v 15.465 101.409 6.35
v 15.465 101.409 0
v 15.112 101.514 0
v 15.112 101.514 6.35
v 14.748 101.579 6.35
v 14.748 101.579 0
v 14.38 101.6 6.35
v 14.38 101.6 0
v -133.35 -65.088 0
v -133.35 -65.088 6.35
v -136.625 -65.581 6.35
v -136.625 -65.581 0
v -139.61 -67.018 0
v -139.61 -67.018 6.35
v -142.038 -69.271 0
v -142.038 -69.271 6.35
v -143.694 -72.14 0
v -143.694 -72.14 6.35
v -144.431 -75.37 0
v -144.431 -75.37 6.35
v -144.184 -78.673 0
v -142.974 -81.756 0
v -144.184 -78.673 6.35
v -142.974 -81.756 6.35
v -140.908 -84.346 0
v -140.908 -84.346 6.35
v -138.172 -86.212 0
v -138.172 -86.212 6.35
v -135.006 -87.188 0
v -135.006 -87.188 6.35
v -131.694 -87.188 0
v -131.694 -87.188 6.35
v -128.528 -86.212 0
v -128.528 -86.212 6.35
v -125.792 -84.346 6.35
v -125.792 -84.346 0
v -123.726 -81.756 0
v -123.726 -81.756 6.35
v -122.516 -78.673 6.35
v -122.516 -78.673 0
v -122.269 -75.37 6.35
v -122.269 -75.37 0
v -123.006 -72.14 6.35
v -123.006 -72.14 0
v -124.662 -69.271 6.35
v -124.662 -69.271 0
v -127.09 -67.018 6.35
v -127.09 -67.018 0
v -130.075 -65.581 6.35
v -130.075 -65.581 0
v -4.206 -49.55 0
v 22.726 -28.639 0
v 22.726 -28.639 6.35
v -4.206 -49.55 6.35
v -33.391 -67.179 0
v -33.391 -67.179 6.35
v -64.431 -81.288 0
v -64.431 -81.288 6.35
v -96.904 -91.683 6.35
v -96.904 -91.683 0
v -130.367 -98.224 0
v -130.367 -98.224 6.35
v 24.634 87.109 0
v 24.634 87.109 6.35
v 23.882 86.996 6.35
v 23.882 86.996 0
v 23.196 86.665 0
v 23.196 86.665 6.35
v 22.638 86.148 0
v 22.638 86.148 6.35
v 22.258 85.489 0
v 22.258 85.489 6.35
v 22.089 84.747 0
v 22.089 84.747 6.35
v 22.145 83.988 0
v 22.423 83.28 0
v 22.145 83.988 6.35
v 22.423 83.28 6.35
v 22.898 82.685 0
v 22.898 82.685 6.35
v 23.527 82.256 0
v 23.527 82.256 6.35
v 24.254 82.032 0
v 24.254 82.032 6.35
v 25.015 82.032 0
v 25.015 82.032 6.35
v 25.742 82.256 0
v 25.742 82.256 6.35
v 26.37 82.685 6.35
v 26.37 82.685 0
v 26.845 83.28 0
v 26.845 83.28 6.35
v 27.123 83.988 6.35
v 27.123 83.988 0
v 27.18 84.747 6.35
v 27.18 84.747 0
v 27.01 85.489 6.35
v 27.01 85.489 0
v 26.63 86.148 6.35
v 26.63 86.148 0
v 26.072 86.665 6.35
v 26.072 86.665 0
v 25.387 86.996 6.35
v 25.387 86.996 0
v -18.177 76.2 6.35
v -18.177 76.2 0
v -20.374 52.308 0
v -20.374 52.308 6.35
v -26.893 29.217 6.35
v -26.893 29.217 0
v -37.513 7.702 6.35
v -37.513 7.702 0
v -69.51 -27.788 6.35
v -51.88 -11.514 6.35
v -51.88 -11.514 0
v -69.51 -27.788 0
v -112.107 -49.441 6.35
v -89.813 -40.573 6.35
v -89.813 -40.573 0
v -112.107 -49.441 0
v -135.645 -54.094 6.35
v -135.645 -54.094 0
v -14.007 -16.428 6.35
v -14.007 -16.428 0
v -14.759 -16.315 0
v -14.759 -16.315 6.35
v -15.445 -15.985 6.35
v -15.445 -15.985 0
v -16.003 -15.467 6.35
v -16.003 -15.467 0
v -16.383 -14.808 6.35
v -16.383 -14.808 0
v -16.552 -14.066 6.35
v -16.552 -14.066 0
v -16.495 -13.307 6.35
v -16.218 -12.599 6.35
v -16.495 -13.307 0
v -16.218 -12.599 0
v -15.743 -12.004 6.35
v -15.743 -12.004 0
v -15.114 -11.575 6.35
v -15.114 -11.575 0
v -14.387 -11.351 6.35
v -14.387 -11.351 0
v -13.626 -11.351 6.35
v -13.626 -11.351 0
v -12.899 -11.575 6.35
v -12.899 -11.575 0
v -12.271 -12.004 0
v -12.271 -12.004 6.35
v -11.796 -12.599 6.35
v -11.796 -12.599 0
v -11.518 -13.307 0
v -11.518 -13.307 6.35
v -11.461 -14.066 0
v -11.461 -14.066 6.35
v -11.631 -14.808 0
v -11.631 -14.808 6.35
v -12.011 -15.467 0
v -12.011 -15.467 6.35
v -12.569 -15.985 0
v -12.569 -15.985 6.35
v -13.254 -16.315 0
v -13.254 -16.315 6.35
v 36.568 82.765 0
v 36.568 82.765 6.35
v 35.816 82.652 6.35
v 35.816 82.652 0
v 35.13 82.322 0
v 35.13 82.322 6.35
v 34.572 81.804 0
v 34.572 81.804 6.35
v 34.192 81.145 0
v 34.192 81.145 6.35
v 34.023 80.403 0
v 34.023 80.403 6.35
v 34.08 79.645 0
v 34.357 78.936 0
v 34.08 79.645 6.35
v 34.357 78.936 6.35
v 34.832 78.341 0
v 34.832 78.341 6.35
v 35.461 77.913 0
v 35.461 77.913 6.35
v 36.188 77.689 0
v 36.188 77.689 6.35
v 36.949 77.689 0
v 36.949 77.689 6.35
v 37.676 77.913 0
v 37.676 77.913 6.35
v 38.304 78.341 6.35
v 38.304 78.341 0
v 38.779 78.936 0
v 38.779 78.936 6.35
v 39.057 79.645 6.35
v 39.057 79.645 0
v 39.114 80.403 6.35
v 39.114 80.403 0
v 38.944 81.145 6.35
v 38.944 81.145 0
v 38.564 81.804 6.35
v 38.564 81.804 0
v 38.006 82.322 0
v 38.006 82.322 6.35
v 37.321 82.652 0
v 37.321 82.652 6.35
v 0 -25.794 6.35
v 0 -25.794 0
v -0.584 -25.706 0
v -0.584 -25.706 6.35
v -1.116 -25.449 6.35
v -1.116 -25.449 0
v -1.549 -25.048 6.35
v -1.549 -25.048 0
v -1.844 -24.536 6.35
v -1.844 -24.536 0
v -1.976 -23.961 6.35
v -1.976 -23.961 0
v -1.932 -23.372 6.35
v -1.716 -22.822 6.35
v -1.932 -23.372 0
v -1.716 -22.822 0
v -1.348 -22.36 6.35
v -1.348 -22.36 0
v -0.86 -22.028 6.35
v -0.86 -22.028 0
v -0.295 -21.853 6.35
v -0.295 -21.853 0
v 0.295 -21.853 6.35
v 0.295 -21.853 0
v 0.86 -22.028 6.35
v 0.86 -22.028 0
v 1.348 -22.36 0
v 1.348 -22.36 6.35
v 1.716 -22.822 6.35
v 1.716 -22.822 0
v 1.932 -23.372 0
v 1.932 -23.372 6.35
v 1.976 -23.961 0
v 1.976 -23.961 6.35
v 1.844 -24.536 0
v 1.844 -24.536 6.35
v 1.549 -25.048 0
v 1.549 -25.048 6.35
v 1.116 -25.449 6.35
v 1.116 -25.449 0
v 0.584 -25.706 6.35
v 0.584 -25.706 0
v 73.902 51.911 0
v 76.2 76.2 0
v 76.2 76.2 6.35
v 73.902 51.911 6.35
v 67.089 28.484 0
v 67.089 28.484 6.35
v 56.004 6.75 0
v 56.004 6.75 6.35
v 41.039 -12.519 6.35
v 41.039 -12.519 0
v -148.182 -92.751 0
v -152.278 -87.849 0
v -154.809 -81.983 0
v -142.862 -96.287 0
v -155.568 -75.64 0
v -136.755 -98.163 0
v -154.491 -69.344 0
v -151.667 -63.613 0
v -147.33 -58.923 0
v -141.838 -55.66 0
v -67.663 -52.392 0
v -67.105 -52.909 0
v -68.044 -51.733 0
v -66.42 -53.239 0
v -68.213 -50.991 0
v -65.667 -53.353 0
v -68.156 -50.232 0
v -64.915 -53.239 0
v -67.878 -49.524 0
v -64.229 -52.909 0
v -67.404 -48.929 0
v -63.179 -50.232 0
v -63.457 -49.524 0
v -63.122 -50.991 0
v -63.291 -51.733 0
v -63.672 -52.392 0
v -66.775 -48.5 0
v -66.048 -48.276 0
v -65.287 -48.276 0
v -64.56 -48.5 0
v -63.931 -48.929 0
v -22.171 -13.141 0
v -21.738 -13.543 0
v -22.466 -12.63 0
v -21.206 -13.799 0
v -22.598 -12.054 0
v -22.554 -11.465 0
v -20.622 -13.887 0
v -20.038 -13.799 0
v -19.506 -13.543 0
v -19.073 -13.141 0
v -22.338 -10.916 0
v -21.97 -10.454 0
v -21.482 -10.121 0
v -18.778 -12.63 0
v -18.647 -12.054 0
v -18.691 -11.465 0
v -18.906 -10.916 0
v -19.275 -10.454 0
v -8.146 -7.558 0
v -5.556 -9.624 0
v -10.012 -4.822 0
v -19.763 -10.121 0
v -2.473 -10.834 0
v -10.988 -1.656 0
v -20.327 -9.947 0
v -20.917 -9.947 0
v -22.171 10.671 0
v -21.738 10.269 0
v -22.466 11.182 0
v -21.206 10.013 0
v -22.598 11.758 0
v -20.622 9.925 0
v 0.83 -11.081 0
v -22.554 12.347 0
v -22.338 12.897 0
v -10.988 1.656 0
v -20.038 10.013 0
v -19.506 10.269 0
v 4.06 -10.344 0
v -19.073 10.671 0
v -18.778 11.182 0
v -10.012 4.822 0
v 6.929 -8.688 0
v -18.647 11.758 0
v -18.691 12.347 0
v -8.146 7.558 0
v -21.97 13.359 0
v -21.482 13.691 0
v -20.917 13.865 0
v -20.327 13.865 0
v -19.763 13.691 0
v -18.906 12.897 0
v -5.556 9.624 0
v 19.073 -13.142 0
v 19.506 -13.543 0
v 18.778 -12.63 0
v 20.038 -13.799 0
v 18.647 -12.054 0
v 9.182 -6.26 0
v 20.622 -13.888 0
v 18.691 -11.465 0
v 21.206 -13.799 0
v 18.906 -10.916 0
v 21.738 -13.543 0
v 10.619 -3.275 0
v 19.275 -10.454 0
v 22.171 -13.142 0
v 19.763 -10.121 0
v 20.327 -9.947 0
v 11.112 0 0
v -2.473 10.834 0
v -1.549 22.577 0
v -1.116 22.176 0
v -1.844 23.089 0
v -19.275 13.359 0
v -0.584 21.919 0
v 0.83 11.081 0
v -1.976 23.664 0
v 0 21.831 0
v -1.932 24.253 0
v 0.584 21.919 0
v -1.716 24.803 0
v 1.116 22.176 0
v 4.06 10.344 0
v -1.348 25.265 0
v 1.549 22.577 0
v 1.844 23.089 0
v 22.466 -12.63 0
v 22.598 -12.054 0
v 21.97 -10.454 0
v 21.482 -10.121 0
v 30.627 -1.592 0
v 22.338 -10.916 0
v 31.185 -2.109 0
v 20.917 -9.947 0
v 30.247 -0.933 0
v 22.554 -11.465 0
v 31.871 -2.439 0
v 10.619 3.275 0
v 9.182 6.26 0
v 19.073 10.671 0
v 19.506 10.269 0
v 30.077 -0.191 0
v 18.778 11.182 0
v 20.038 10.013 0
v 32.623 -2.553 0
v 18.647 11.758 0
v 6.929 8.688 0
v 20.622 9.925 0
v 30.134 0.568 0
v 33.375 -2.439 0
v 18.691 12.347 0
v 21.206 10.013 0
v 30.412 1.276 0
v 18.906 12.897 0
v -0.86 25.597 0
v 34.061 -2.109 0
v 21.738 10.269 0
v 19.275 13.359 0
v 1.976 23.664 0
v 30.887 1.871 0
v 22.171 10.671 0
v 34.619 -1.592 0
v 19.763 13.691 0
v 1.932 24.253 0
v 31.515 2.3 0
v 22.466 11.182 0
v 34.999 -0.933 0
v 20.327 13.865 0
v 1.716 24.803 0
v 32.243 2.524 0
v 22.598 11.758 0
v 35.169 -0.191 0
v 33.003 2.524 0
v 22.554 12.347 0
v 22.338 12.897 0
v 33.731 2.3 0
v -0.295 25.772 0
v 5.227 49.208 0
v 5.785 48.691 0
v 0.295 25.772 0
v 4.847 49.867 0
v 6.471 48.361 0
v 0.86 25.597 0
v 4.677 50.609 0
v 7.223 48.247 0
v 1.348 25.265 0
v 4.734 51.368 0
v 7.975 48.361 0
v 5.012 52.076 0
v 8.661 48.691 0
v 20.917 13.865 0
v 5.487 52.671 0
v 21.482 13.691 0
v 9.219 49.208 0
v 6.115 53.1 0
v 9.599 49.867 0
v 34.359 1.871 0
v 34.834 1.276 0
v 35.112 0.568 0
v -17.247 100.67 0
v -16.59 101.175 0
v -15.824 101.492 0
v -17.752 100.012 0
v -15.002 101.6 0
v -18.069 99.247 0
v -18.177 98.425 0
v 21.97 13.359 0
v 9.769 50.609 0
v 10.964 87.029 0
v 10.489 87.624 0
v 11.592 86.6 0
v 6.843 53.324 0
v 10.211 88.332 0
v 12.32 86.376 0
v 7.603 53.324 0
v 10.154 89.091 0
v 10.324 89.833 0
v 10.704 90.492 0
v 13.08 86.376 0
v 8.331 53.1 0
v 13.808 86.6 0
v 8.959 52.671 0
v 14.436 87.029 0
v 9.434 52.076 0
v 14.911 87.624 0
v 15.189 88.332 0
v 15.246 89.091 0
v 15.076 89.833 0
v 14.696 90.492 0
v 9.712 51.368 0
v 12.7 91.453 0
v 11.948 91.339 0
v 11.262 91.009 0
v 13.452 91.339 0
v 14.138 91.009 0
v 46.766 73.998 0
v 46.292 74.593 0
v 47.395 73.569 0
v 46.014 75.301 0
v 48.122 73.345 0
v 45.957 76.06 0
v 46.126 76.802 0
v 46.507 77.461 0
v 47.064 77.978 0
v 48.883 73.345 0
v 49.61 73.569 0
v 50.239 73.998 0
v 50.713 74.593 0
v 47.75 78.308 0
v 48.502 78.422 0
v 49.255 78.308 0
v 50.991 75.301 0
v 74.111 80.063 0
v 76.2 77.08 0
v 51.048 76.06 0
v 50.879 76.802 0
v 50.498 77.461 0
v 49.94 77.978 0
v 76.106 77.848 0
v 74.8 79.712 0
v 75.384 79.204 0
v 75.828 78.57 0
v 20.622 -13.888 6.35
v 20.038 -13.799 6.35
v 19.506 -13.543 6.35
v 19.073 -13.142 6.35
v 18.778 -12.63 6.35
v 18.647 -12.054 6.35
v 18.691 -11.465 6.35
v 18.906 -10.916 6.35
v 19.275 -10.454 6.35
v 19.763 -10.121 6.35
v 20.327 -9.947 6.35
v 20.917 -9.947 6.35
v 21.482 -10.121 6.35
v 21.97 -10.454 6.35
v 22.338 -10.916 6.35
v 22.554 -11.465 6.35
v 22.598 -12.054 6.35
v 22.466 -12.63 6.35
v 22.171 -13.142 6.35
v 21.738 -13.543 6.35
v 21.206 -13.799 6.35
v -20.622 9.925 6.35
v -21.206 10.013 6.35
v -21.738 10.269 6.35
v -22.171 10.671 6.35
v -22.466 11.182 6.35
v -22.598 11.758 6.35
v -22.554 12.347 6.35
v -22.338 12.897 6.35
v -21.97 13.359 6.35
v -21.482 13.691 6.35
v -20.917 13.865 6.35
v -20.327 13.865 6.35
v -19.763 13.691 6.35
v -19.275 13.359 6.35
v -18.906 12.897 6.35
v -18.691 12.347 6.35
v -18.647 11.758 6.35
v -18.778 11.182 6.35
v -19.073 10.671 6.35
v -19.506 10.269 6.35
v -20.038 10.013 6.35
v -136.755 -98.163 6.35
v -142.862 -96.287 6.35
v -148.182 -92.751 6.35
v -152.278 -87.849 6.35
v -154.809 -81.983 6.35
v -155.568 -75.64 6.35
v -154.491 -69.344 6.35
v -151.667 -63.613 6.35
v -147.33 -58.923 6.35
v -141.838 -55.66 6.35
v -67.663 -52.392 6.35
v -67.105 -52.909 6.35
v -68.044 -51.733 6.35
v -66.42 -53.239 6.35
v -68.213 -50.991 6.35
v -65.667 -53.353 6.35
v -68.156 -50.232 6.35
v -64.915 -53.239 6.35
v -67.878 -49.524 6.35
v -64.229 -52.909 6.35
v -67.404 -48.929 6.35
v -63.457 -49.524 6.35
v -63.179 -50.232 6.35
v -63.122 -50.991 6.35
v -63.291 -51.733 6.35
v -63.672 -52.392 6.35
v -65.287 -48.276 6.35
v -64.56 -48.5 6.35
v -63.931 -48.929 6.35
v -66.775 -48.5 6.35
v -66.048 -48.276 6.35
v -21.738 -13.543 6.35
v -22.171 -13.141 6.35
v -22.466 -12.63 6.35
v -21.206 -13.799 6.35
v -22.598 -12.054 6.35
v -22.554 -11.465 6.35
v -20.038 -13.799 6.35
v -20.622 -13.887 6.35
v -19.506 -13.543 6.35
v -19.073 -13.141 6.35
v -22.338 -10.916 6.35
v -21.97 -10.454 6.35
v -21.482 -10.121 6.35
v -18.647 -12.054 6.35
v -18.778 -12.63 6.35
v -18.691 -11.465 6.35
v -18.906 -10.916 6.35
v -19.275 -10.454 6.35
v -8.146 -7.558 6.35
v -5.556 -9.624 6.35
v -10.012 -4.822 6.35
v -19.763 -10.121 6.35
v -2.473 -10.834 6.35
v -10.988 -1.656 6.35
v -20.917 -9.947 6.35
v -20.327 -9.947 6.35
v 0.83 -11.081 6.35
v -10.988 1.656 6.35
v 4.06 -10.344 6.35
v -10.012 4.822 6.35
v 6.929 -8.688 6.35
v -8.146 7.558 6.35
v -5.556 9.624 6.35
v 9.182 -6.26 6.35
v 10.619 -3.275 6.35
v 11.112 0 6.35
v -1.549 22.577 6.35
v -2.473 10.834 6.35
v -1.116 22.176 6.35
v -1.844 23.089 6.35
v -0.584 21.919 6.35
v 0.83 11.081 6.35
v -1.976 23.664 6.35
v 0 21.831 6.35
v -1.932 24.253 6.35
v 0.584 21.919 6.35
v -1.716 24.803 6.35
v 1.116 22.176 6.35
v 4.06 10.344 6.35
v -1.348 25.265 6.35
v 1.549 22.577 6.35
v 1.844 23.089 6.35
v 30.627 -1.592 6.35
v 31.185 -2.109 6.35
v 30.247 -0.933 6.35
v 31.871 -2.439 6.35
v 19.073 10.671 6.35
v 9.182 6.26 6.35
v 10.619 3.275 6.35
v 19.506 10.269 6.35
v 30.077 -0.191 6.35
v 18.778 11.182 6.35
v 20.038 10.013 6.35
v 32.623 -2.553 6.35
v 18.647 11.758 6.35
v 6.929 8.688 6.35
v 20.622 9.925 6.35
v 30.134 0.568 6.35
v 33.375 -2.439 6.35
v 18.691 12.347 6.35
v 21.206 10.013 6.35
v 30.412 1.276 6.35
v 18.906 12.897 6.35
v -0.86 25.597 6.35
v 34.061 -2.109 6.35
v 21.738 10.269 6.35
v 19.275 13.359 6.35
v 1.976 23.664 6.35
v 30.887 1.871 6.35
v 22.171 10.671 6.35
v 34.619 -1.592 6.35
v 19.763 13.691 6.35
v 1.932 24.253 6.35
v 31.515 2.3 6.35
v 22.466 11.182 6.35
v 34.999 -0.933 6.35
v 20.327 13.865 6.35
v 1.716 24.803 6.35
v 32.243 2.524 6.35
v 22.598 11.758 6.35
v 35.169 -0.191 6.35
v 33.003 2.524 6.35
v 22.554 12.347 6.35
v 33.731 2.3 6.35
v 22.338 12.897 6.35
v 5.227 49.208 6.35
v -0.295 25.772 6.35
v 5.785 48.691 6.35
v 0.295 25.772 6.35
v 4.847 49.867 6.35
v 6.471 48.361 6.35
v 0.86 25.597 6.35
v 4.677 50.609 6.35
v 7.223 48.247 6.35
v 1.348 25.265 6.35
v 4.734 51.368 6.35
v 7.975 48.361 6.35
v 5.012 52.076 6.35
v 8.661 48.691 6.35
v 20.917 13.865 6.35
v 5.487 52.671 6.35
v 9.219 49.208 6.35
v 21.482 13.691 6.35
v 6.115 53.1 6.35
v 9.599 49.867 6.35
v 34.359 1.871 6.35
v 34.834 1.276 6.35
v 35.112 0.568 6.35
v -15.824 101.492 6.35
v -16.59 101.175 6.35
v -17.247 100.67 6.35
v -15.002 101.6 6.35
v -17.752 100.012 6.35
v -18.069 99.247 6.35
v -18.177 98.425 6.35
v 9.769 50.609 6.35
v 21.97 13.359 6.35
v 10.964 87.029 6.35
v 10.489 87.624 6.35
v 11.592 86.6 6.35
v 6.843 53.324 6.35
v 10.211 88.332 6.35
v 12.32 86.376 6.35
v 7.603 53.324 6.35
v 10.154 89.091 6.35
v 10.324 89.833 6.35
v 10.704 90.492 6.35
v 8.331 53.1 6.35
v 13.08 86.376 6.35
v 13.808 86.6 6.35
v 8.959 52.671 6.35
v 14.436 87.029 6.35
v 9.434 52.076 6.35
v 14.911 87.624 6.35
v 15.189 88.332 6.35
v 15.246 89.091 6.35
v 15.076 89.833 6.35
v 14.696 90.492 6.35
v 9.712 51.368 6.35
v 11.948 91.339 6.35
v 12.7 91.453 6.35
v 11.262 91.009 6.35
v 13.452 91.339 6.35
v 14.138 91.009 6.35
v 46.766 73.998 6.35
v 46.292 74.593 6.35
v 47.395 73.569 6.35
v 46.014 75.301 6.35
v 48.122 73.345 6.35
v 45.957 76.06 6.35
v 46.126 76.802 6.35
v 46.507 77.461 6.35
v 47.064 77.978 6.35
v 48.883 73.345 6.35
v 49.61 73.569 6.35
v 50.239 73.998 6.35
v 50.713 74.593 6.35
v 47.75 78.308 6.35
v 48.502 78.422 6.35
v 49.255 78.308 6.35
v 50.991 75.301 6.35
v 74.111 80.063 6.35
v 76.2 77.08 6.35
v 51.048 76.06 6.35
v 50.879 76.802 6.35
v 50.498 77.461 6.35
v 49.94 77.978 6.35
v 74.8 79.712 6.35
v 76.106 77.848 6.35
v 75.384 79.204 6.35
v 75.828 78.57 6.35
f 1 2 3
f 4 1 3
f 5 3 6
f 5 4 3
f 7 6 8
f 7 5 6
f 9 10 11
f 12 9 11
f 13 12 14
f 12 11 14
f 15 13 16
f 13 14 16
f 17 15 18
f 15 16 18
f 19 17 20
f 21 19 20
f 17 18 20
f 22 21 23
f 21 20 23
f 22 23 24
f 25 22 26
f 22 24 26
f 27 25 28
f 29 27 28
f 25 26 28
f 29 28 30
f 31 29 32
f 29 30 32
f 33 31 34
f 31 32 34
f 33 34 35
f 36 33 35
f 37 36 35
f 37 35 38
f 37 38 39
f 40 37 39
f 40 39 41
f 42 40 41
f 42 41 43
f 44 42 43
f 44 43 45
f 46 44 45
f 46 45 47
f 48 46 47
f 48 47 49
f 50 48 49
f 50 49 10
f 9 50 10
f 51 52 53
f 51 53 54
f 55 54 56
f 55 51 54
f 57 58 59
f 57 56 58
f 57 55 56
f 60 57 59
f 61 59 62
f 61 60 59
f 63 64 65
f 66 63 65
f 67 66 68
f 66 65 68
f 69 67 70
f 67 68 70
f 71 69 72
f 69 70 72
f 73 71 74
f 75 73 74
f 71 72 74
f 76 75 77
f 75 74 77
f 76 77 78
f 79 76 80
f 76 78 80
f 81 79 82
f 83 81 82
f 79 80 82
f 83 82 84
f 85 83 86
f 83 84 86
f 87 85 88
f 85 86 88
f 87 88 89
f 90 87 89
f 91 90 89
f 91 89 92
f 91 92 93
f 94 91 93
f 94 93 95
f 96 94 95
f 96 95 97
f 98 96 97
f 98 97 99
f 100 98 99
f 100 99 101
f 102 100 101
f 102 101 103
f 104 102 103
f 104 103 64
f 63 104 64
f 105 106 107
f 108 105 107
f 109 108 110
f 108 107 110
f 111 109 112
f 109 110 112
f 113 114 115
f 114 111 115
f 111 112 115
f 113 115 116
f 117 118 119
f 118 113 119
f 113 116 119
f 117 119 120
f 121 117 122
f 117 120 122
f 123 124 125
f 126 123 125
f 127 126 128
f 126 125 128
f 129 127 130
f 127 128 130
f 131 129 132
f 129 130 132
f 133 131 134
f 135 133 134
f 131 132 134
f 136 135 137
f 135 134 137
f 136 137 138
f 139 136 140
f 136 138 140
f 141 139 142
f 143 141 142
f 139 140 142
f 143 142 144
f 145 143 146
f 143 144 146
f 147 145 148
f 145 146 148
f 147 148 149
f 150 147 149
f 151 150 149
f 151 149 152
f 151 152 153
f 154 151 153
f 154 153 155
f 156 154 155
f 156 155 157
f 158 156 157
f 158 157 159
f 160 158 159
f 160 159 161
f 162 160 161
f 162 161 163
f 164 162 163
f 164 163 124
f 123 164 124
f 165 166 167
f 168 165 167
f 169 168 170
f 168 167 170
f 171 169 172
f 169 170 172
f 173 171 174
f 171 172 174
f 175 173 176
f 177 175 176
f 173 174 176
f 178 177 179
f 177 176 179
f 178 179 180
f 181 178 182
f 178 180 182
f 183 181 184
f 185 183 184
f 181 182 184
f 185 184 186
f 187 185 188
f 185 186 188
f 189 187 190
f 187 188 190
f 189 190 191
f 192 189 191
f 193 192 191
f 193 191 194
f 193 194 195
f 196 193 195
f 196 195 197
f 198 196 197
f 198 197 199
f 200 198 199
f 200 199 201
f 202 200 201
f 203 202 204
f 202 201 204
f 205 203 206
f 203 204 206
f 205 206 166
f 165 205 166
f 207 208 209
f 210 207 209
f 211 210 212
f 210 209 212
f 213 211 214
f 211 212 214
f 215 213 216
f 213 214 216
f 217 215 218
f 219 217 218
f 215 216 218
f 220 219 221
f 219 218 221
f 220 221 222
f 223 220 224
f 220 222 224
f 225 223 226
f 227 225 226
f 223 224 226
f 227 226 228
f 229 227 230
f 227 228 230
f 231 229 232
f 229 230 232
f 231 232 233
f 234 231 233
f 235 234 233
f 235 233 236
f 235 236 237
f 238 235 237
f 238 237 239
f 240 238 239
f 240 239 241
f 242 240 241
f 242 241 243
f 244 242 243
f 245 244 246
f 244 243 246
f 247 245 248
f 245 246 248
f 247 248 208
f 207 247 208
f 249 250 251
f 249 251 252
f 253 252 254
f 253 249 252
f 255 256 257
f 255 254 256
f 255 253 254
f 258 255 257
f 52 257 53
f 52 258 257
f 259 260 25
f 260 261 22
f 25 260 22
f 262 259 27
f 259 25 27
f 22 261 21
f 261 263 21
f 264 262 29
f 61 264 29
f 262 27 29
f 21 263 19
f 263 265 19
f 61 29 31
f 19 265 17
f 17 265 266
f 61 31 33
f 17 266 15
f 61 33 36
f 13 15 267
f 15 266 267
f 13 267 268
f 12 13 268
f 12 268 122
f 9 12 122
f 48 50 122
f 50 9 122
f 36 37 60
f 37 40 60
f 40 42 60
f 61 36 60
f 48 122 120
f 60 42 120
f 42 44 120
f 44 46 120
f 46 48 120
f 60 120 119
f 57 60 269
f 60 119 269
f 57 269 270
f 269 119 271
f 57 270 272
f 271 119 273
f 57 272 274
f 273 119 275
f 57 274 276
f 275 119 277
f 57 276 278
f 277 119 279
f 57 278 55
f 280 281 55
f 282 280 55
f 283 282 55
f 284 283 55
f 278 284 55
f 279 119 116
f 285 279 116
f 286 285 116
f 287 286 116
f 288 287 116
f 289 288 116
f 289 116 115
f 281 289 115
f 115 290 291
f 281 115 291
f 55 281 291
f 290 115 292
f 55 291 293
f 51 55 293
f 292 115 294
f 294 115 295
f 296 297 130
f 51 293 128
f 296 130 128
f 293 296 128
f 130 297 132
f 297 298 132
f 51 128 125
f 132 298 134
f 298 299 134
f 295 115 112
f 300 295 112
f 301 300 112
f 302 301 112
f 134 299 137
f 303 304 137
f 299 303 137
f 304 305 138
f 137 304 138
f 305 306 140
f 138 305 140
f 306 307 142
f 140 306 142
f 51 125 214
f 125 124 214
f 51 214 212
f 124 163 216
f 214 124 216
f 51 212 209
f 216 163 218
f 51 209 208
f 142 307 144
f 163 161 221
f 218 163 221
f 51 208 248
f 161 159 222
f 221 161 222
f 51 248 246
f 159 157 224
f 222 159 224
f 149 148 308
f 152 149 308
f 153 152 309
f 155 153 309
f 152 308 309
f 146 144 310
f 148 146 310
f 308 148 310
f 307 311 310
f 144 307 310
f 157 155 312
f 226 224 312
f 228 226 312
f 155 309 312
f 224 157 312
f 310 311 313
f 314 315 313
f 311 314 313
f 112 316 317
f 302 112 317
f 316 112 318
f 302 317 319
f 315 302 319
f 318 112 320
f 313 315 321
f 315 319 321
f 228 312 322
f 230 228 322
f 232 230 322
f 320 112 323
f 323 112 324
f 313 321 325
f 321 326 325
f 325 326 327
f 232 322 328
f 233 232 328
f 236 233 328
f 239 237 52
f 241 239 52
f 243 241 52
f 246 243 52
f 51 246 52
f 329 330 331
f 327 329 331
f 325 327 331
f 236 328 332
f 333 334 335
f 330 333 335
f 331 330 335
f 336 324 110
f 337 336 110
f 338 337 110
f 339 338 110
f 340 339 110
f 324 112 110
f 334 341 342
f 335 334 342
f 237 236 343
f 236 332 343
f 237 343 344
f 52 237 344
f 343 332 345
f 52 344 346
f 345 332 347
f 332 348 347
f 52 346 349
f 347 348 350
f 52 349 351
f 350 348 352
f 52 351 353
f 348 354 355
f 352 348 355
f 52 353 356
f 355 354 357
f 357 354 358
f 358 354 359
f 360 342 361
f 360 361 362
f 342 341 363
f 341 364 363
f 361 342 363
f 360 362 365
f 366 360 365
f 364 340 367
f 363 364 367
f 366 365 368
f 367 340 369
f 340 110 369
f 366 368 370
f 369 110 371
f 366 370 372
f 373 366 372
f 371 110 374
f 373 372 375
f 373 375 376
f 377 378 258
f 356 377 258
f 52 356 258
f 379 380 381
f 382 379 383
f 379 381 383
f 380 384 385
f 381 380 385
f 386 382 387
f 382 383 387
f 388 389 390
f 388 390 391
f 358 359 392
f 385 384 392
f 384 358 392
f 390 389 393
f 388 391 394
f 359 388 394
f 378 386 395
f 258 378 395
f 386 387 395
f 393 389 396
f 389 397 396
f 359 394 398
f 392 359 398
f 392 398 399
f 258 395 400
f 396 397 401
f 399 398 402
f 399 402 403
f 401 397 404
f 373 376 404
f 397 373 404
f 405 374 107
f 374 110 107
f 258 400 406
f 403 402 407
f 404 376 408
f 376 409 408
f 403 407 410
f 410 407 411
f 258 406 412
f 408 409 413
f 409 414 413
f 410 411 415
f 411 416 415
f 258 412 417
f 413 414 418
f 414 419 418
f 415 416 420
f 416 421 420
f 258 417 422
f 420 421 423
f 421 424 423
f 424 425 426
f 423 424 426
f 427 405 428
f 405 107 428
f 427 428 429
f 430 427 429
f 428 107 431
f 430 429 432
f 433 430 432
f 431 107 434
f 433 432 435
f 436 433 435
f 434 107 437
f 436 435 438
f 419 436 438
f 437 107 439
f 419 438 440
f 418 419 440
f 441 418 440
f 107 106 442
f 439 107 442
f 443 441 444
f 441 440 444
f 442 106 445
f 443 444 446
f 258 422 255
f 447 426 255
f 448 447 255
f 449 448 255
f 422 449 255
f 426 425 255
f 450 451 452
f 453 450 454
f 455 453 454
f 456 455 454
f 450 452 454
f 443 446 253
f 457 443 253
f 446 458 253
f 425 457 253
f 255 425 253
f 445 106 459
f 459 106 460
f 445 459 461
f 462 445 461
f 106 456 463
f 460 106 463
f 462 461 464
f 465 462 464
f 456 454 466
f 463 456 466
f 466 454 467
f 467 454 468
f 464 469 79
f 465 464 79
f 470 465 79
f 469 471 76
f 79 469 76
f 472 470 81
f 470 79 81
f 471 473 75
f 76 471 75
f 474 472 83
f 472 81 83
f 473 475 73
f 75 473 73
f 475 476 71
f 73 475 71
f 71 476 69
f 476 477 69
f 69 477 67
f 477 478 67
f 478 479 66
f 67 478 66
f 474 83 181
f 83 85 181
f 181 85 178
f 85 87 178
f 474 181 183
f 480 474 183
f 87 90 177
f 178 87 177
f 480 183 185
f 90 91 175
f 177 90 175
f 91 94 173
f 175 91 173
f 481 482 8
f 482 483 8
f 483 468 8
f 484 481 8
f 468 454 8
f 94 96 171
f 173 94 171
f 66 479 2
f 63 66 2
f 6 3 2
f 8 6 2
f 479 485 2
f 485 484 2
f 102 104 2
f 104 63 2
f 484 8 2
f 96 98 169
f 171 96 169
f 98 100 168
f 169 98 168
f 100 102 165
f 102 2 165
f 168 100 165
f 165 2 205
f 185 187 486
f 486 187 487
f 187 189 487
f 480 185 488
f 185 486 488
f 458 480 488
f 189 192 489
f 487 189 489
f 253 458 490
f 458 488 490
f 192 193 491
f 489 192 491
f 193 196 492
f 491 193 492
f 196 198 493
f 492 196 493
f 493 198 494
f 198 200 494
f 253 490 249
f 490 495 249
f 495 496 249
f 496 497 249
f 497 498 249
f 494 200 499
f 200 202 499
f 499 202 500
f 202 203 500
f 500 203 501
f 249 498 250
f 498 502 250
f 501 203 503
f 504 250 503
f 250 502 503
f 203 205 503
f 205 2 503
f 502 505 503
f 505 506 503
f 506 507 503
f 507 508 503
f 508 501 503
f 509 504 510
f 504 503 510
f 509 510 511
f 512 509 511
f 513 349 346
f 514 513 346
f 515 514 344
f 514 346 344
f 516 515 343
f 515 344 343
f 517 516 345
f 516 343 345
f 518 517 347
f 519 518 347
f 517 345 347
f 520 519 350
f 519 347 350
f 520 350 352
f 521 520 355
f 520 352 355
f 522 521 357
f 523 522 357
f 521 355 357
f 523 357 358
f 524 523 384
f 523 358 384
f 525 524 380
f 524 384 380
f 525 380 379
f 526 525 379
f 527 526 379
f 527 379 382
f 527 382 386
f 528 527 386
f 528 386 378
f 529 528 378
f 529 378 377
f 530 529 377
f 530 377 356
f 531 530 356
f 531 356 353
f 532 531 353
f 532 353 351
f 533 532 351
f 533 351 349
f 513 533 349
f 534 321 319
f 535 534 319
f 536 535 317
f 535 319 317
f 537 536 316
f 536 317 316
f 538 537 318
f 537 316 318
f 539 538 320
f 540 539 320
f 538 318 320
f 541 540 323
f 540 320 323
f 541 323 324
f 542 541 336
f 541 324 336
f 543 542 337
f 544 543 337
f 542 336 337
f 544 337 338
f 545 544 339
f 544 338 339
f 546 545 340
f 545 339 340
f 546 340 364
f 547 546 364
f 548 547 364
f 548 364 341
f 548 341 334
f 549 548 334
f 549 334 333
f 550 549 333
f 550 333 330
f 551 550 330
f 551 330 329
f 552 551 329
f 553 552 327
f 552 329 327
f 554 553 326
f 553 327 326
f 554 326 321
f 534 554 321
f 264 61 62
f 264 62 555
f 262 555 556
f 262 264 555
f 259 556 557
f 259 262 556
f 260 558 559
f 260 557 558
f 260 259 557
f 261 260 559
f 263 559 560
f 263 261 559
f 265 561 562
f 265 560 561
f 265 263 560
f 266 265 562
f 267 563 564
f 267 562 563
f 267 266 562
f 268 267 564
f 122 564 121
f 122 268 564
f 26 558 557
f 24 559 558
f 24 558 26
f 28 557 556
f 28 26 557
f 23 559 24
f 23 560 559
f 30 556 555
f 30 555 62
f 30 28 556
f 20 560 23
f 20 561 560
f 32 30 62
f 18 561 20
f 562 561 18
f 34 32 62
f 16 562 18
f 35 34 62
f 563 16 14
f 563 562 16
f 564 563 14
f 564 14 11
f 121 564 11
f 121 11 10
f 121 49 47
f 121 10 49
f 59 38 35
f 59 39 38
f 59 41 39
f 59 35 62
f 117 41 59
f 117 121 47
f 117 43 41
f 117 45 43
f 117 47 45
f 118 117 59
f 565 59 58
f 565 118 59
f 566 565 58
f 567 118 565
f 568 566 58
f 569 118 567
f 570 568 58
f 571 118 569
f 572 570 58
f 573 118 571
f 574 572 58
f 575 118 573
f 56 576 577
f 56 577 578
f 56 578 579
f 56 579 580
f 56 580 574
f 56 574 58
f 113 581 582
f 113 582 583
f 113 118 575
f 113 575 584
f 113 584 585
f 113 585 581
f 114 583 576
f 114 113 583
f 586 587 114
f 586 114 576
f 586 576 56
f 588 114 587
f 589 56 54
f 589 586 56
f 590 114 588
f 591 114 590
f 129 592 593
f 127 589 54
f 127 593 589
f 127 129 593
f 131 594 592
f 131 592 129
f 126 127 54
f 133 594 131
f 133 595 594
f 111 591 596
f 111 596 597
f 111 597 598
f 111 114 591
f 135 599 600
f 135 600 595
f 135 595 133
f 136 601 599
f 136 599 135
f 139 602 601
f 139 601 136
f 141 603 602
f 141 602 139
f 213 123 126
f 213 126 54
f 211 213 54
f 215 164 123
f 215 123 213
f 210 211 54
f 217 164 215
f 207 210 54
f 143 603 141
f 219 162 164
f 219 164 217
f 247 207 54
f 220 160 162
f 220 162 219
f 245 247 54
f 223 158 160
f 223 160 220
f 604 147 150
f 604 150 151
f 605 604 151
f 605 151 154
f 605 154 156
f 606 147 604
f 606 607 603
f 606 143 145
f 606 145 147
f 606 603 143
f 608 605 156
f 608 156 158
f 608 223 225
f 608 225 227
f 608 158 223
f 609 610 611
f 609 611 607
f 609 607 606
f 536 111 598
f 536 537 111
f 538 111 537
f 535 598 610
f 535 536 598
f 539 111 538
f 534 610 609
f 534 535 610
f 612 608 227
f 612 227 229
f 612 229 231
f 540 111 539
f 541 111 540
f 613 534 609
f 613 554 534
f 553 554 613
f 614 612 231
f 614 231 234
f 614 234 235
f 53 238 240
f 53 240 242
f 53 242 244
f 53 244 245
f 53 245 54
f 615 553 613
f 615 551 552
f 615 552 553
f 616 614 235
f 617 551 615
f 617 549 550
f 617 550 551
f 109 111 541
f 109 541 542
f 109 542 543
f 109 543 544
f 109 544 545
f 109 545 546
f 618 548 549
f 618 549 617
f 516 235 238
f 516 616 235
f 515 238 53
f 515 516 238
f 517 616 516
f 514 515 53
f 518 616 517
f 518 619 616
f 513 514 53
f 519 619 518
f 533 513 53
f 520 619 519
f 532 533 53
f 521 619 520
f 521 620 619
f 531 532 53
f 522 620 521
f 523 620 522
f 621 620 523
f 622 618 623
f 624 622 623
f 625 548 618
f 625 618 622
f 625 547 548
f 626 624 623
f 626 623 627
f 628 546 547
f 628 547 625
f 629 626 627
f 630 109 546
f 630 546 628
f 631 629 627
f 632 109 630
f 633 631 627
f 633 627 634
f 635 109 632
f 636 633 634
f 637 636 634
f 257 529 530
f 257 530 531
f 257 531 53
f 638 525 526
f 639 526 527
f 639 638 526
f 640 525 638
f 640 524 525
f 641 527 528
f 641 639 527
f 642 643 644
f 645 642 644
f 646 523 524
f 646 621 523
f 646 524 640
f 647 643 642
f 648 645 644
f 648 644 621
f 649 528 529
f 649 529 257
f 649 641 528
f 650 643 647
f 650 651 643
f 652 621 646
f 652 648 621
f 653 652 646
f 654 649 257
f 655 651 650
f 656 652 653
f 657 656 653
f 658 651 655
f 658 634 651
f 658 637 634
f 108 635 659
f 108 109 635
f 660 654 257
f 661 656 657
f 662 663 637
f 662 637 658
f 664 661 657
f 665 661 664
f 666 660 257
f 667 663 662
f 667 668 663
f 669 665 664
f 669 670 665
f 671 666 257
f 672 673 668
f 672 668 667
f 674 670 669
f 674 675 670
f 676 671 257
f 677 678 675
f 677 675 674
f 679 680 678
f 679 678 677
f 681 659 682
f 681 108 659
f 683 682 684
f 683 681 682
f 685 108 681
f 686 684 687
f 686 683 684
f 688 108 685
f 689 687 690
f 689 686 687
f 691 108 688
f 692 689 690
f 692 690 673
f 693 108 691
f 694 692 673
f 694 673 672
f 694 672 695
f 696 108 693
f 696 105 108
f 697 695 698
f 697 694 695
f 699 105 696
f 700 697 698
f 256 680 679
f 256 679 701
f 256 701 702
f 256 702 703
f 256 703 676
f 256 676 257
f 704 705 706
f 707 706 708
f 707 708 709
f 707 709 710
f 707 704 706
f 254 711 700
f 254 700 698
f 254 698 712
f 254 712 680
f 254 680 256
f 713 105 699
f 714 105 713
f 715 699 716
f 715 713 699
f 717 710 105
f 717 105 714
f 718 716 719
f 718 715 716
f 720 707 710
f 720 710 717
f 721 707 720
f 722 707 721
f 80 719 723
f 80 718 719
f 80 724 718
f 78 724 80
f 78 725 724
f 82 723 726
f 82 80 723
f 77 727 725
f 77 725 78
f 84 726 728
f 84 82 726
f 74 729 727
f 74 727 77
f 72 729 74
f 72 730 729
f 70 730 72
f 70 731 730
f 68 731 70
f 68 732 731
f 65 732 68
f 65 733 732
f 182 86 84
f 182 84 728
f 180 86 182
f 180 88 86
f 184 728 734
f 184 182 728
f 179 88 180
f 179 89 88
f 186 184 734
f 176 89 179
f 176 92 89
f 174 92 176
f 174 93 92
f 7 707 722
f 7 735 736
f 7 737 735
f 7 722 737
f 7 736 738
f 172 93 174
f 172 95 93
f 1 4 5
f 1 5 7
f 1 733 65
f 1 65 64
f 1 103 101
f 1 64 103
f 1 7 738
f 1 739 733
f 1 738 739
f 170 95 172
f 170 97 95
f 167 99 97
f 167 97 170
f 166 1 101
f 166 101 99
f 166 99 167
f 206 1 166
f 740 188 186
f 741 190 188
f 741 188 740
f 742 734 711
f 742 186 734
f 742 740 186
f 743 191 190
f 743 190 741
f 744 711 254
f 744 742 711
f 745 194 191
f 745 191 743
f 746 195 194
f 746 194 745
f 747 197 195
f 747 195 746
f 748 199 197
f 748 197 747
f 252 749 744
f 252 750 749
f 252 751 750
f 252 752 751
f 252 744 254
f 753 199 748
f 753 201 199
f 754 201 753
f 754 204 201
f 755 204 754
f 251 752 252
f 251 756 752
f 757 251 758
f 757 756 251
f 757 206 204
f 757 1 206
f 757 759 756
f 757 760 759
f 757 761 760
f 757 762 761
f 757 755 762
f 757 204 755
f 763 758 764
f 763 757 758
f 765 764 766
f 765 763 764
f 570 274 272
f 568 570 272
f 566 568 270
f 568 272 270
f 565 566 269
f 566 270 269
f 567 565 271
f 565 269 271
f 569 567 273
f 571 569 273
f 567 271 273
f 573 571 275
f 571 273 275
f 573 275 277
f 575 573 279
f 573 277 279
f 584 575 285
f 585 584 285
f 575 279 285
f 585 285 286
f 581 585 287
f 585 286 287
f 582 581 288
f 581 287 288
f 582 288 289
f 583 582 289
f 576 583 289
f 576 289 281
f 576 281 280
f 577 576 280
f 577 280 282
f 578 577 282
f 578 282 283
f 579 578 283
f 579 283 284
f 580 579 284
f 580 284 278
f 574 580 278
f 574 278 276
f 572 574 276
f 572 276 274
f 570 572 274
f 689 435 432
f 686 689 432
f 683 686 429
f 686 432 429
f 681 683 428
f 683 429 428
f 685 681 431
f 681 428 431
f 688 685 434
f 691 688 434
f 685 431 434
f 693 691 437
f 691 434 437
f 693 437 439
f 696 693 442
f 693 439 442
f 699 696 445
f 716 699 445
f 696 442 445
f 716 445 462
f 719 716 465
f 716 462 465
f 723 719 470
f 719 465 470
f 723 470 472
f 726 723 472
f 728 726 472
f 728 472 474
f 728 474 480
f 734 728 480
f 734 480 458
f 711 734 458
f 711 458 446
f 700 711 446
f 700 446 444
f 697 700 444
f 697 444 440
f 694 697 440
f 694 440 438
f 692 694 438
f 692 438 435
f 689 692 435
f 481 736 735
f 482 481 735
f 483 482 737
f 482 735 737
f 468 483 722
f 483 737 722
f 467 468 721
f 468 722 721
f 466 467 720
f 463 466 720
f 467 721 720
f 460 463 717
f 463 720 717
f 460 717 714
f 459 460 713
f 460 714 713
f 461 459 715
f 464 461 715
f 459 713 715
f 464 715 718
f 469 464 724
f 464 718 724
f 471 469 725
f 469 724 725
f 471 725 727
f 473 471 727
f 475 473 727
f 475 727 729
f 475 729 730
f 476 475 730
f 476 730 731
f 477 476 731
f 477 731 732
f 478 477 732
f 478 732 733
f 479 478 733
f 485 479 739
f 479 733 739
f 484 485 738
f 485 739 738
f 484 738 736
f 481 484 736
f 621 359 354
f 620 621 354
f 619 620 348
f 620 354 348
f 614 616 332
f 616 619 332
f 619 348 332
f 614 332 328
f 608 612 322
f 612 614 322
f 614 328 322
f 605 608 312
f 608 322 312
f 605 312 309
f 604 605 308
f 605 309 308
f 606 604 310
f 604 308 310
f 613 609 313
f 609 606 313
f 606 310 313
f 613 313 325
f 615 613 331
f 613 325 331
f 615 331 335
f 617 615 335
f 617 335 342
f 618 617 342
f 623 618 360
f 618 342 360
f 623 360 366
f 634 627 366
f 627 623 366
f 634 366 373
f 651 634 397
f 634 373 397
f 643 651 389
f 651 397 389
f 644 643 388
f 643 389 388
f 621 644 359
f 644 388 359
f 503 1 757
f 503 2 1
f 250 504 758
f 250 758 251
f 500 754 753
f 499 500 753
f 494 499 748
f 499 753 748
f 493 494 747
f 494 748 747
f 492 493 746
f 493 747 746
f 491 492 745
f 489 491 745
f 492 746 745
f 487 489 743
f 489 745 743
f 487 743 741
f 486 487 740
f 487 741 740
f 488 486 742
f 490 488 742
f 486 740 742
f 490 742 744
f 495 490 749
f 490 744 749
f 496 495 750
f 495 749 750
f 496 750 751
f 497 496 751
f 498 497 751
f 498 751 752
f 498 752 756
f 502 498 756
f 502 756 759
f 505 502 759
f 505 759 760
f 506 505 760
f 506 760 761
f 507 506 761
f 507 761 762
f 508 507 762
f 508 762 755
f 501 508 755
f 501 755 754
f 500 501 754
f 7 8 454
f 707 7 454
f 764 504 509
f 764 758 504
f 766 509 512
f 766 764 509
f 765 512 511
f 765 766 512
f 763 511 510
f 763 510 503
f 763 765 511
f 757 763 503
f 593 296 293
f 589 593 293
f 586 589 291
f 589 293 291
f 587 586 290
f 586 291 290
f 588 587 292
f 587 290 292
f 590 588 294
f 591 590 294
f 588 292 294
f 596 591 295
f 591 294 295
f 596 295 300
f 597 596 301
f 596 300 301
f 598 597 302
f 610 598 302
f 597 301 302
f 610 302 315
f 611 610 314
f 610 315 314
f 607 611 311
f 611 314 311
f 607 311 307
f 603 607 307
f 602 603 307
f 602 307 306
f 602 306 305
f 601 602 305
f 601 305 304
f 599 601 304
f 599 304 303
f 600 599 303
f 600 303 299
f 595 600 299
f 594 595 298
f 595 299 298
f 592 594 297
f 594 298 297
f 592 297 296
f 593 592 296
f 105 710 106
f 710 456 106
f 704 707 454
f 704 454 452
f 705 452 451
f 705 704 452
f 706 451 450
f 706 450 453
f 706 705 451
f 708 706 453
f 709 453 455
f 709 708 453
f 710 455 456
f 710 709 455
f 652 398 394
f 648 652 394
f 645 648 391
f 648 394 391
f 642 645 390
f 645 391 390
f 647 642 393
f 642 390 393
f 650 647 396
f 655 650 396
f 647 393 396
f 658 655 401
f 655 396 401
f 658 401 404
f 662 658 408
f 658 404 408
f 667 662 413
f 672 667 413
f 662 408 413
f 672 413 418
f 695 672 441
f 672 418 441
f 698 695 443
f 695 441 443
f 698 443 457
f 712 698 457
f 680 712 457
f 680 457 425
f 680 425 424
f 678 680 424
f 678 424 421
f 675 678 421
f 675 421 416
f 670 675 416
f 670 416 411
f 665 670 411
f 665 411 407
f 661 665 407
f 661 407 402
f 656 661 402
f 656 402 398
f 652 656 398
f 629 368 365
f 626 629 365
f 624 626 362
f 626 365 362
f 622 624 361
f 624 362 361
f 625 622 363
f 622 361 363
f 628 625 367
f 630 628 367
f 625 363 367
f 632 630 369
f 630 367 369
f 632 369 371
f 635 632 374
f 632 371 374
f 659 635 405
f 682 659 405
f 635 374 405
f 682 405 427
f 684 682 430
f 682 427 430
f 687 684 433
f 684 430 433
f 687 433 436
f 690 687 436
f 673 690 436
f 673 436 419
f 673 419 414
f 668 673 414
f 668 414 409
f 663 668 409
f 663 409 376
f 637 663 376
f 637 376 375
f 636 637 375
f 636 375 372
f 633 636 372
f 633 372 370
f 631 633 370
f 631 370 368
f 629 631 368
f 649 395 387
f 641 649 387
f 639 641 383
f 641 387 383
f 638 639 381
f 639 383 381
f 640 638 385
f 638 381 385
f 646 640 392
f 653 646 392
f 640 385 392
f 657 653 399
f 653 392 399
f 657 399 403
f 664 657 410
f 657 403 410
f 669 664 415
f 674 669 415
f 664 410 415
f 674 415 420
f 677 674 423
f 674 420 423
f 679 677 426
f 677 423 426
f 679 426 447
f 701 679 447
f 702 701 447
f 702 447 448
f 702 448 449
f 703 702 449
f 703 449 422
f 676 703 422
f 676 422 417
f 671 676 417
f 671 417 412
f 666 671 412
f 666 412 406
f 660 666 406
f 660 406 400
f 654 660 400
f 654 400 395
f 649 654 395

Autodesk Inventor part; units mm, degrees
ref_plane "YZ Plane" through (0, 0, 0) normal (1, 0, 0) x (0, 1, 0)
ref_plane "XZ Plane" through (0, 0, 0) normal (0, 1, 0) x (-1, 0, 0)
ref_plane "XY Plane" through (0, 0, 0) normal (0, 0, 1) x (1, 0, 0)
sketch "Sketch1" plane through (0, 0, 0) normal (0, 0, 1) x (1, 0, 0)
  line L0 (-146.05, 101.6) -> (76.2, 101.6) construction
  line L1 (76.2, 101.6) -> (76.2, 76.2) construction
  line L2 (76.2, 76.2) -> (-146.05, 76.2) construction
  line L3 (-146.05, 76.2) -> (-146.05, 101.6) construction
  circle A0 centre (-133.35, -76.2) radius 12.7 construction
  circle A1 centre (0, 0) radius 23.8125 construction
  circle A2 centre (0, 0) radius 11.1125
  circle A3 centre (0, 0) radius 36.5125 construction
  line L4 (76.2, 101.6) -> (76.2, 76.2)
  line L5 (76.2, 101.6) -> (-18.177, 101.6)
  line L6 (-18.177, 101.6) -> (-18.177, 76.2)
  circle A4 centre (-133.35, -76.2) radius 22.225 construction
  arc A5 (-135.6449, -54.0938) -> (-18.177, 76.2) centre (-149.171, 76.2) ccw
  arc A6 (-130.367, -98.2239) -> (24.2247, -27.319) centre (-169.5727, 191.233) ccw
  arc A7 (-135.6449, -54.0938) -> (-130.367, -98.2239) centre (-133.35, -76.2) ccw
  arc A8 (20.9302, -29.9181) -> (76.2, 76.2) centre (-53.3082, 76.2) ccw
  arc A9 (24.2247, -27.319) -> (30.9373, -19.3918) centre (0, 0) ccw
  line L7 (-69.85, 101.6) -> (-69.85, 76.2) construction
  line L8 (12.7, 88.9) -> (75.7926, 65.9362) construction
  line L9 (14.9394, 101.6) -> (76.2, 79.3029)
  point P0 (63.5, 88.9)
  point P1 (76.2, 88.9)
  point P2 (50.8, 88.9)
  point P3 (38.1, 88.9)
  point P4 (25.4, 88.9)
  point P5 (20.9302, -29.9181)
  point P6 (-34.5726, 11.7429)
  point P7 (22.7258, -28.6389)
  point P8 (-69.85, 88.9)
  point P9 (24.6341, 84.5563)
  point P10 (36.5682, 80.2127)
  point P11 (48.5023, 75.869)
  dimension "d0" = 25.4
  dimension "d1" = 76.2
  dimension "d2" = 222.25
  dimension "d3" = 146.05
  dimension "d4" = 25.4
  dimension "d5" = 76.2
  dimension "d7" = 12.7
  dimension "d8" = 47.625
  dimension "d9" = 22.225
  dimension "d12" = 12.7
  dimension "d17" = 12.7
  dimension "d18" = 9.525
  dimension "d19" = 292.1
  dimension "d37" = 146.05
  dimension "d38" = 63.5
  dimension "d39" = 20
  dimension "d42" = 12.7
  dimension "d47" = 12.7
extrude "Extrusion1" add sketch "Sketch1" along normal blind 6.35 contours L4 A8 A6 A7 A5 L6 L5 L9
hole "Hole1" at (36.5682, 80.2127, 0) at (48.5023, 75.869, 0) at (24.6341, 84.5563, 0) at (12.7, 88.9, 0) direction (0, 0, 1) diameter 5.1054 end through all clearance for "Flat Head Machine Screw (82)" size "#10" standard "Ansi Unified Screw Threads"
hole "Hole2" at (-133.35, -76.2, 0) direction (0, 0, 1) diameter 22.225 end through all
fillet "Fillet1" radius 3.175 3 edges at (76.2, 79.3029, 3.175) (14.9394, 101.6, 3.175) (-18.177, 101.6, 3.175)
sketch "Sketch3" plane through (0, 0, 6.35) normal (0, 0, 1) x (1, 0, 0)
  arc A0 (-15.002, 101.6) -> (-18.177, 98.425) centre (-15.002, 98.425) ccw construction
  line L0 (-18.177, 98.425) -> (-18.177, 76.2) construction
  arc A1 (-135.6449, -54.0938) -> (-18.177, 76.2) centre (-149.171, 76.2) ccw construction
  arc A2 (-135.6449, -54.0938) -> (-130.367, -98.2239) centre (-133.35, -76.2) ccw construction
  arc A3 (-130.367, -98.2239) -> (22.7258, -28.6389) centre (-169.5727, 191.233) ccw construction
  arc A4 (22.7258, -28.6389) -> (76.2, 76.2) centre (-53.3082, 76.2) ccw construction
  line L1 (76.2, 76.2) -> (76.2, 77.0798) construction
  arc A5 (76.2, 77.0798) -> (74.1109, 80.0633) centre (73.025, 77.0798) ccw construction
  line L2 (74.1109, 80.0633) -> (15.4654, 101.4085) construction
  arc A6 (15.4654, 101.4085) -> (14.3795, 101.6) centre (14.3795, 98.425) ccw construction
  line L3 (14.3795, 101.6) -> (-15.002, 101.6) construction
  circle A7 centre (-133.35, -76.2) radius 11.1125 construction
  circle A8 centre (24.6341, 84.5563) radius 2.5527 construction
  circle A9 centre (36.5682, 80.2127) radius 2.5527 construction
  circle A10 centre (48.5023, 75.869) radius 2.5527 construction
  circle A11 centre (12.7, 88.9) radius 2.5527 construction
  circle A12 centre (0, 0) radius 11.1125 construction
  circle A13 centre (0, 0) radius 23.8125 construction
  point P0 (0, 23.8125)
  point P1 (-20.6222, 11.9063)
  point P2 (-20.6222, -11.9062)
  point P3 (0, -23.8125)
  point P4 (20.6222, -11.9063)
  point P5 (20.6222, 11.9062)
  dimension "d49" = 47.625
  dimension "d52" = 360
hole "Hole3" at (0, 23.8125, 6.35) at (-20.6222, 11.9063, 6.35) at (-20.6222, -11.9062, 6.35) at (0, -23.8125, 6.35) at (20.6222, -11.9063, 6.35) at (20.6222, 11.9062, 6.35) direction (0, 0, -1) diameter 3.9624 end through all thread size "10-32 UNF" class "2B" standard "ANSI Unified Screw Threads"
sketch "Sketch6" plane through (0, 0, 6.35) normal (0, 0, 1) x (1, 0, 0)
  line L0 (14.3795, 101.6) -> (-15.002, 101.6) construction
  line L1 (-18.177, 98.425) -> (-18.177, 76.2) construction
  circle A0 centre (20.6222, -11.9063) radius 1.9812 construction
  circle A1 centre (-20.6222, -11.9062) radius 1.9812 construction
  circle A2 centre (0, 23.8125) radius 1.9812 construction
  circle A3 centre (-20.6222, 11.9063) radius 1.9812 construction
  circle A4 centre (0, -23.8125) radius 1.9812 construction
  circle A5 centre (20.6222, 11.9062) radius 1.9812 construction
  arc A6 (-15.002, 101.6) -> (-18.177, 98.425) centre (-15.002, 98.425) ccw construction
  line L2 (-18.177, 98.425) -> (-18.177, 76.2) construction
  arc A7 (-135.6449, -54.0938) -> (-18.177, 76.2) centre (-149.171, 76.2) ccw construction
  arc A8 (-135.6449, -54.0938) -> (-130.367, -98.2239) centre (-133.35, -76.2) ccw construction
  arc A9 (-130.367, -98.2239) -> (22.7258, -28.6389) centre (-169.5727, 191.233) ccw construction
  arc A10 (22.7258, -28.6389) -> (76.2, 76.2) centre (-53.3082, 76.2) ccw construction
  line L3 (76.2, 76.2) -> (76.2, 77.0798) construction
  arc A11 (76.2, 77.0798) -> (74.1109, 80.0633) centre (73.025, 77.0798) ccw construction
  line L4 (74.1109, 80.0633) -> (15.4654, 101.4085) construction
  arc A12 (15.4654, 101.4085) -> (14.3795, 101.6) centre (14.3795, 98.425) ccw construction
  line L5 (14.3795, 101.6) -> (-15.002, 101.6) construction
  circle A13 centre (-133.35, -76.2) radius 11.1125 construction
  circle A14 centre (24.6341, 84.5563) radius 2.5527 construction
  circle A15 centre (36.5682, 80.2127) radius 2.5527 construction
  circle A16 centre (48.5023, 75.869) radius 2.5527 construction
  circle A17 centre (12.7, 88.9) radius 2.5527 construction
  circle A18 centre (0, 0) radius 11.1125 construction
  circle A19 centre (-133.35, -76.2) radius 11.1125 construction
  arc A20 (-133.35, -76.2) -> (0, 0) centre (-190.0979, 177.8901) ccw construction
  point P0 (7.223, 50.8)
  point P1 (32.623, 0)
  point P2 (-65.6674, -50.8)
  point P3 (-14.0068, -13.8754)
  dimension "d76" = 50.8
  dimension "d77" = 50.8
  dimension "d78" = 25.4
  dimension "d79" = 25.4
  dimension "d91" = 260.35
  dimension "d92" = 63.5
  dimension "d93" = 25.4
hole "Hole4" at (7.223, 50.8, 6.35) at (32.623, 0, 6.35) at (-65.6674, -50.8, 6.35) at (-14.0068, -13.8754, 6.35) direction (0, 0, -1) diameter 5.1054 end through all clearance for "Flat Head Machine Screw (82)" size "#10" standard "Ansi Unified Screw Threads"
sketch "Sketch4" plane through (0, 0, 6.35) normal (0, 0, 1) x (1, 0, 0)
  circle A0 centre (20.6222, -11.9063) radius 1.9812 construction
  circle A1 centre (-20.6222, -11.9062) radius 1.9812 construction
  circle A2 centre (0, 23.8125) radius 1.9812 construction
  circle A3 centre (-20.6222, 11.9063) radius 1.9812 construction
  circle A4 centre (0, -23.8125) radius 1.9812 construction
  circle A5 centre (20.6222, 11.9062) radius 1.9812 construction
  arc A6 (-5.9095, 152.4) -> (-9.0845, 149.225) centre (-5.9095, 149.225) ccw construction
  line L0 (-9.0845, 149.225) -> (-9.0845, 127) construction
  arc A7 (-144.4803, -107.7629) -> (-9.0845, 127) centre (-280.3101, 127) ccw construction
  arc A8 (-144.4803, -107.7629) -> (-126.1231, -148.0172) centre (-133.35, -127) ccw construction
  arc A9 (-126.1231, -148.0172) -> (30.851, -19.5766) centre (-221.1051, 128.2089) ccw construction
  arc A10 (30.851, -19.5766) -> (76.2, 127) centre (-183.3562, 127) ccw construction
  line L1 (76.2, 127) -> (76.2, 127.8798) construction
  arc A11 (76.2, 127.8798) -> (74.1109, 130.8633) centre (73.025, 127.8798) ccw construction
  line L2 (74.1109, 130.8633) -> (15.4654, 152.2085) construction
  arc A12 (15.4654, 152.2085) -> (14.3795, 152.4) centre (14.3795, 149.225) ccw construction
  line L3 (14.3795, 152.4) -> (-5.9095, 152.4) construction
  circle A13 centre (-133.35, -127) radius 11.1125 construction
  circle A14 centre (24.6341, 135.3563) radius 2.5527 construction
  circle A15 centre (36.5682, 131.0127) radius 2.5527 construction
  circle A16 centre (48.5023, 126.669) radius 2.5527 construction
  circle A17 centre (12.7, 139.7) radius 2.5527 construction
  circle A18 centre (0, 0) radius 11.1125 construction
  circle A19 centre (0, 0) radius 30.1625 construction
  arc A20 (25.4856, -16.173) -> (69.8464, 125.6579) centre (-183.3562, 127) ccw construction
  arc A21 (-128.1879, -142.0123) -> (25.4856, -16.173) centre (-221.1051, 128.2089) ccw construction
  arc A22 (-141.3002, -113.2592) -> (-128.1879, -142.0123) centre (-133.35, -127) ccw construction
  arc A23 (-141.3002, -113.2592) -> (-2.7345, 127) centre (-280.3101, 127) ccw construction
  line L4 (-2.7345, 127) -> (-2.7345, 146.05) construction
  line L5 (-2.7345, 146.05) -> (13.8197, 146.05) construction
  line L6 (69.8464, 125.6579) -> (13.8197, 146.05) construction
  circle A24 centre (12.7, 139.7) radius 8.9027 construction
  circle A25 centre (24.6341, 84.5563) radius 2.5527 construction
  circle A26 centre (24.6341, 135.3563) radius 8.9027 construction
  circle A27 centre (36.5682, 131.0127) radius 8.9027 construction
  circle A28 centre (48.5023, 126.669) radius 8.9027 construction
  circle A29 centre (-133.35, -127) radius 17.4625 construction
  arc A30 (-18.2433, 35.5165) -> (-2.7345, 127) centre (-280.3101, 127) ccw
  arc A31 (38.1257, 4.2843) -> (69.8464, 125.6579) centre (-183.3562, 127) ccw
  arc A32 (-135.2217, -109.6381) -> (-36.2919, -5.3003) centre (-280.3101, 127) ccw
  arc A33 (-121.1415, -139.4856) -> (-135.2217, -109.6381) centre (-133.35, -127) ccw
  line L7 (-18.2433, 35.5165) -> (-7.0656, 29.3233)
  line L8 (38.1257, 4.2843) -> (28.6082, 9.5576)
  line L9 (14.5187, -33.4528) -> (7.0656, -29.3233)
  line L10 (-36.2919, -5.3003) -> (-28.6082, -9.5576)
  arc A34 (-121.1415, -139.4856) -> (14.5187, -33.4528) centre (-221.1051, 128.2089) ccw
  circle A35 centre (0, 0) radius 11.1125 construction
  arc A36 (-28.6082, -9.5576) -> (7.0656, -29.3233) centre (0, 0) ccw
  arc A37 (28.6082, 9.5576) -> (-7.0656, 29.3233) centre (0, 0) ccw
  arc A38 (40.4011, 122.9773) -> (56.5376, 130.5019) centre (48.5023, 126.669) ccw
  arc A39 (28.467, 127.321) -> (40.4011, 122.9773) centre (36.5682, 131.0127) ccw
  arc A40 (16.5329, 131.6646) -> (28.467, 127.321) centre (24.6341, 135.3563) ccw
  arc A41 (6.4602, 133.35) -> (16.5329, 131.6646) centre (12.7, 139.7) ccw
  line L11 (6.4602, 133.35) -> (-2.7345, 133.35)
  line L12 (-2.7345, 133.35) -> (-2.7345, 127)
  line L13 (69.8464, 125.6579) -> (56.5376, 130.5019)
  dimension "d62" = 6.35
  dimension "d63" = 6.35
  dimension "d64" = 6.35
  dimension "d65" = 6.35
  dimension "d66" = 6.35
  dimension "d67" = 6.35
  dimension "d68" = 22.225
  dimension "d69" = 22.225
  dimension "d70" = 12.7
  dimension "d74" = 351.8694
  dimension "d75" = 127.1124
properties part number "CL7-008" material "Polycarbonate, Smoke"
